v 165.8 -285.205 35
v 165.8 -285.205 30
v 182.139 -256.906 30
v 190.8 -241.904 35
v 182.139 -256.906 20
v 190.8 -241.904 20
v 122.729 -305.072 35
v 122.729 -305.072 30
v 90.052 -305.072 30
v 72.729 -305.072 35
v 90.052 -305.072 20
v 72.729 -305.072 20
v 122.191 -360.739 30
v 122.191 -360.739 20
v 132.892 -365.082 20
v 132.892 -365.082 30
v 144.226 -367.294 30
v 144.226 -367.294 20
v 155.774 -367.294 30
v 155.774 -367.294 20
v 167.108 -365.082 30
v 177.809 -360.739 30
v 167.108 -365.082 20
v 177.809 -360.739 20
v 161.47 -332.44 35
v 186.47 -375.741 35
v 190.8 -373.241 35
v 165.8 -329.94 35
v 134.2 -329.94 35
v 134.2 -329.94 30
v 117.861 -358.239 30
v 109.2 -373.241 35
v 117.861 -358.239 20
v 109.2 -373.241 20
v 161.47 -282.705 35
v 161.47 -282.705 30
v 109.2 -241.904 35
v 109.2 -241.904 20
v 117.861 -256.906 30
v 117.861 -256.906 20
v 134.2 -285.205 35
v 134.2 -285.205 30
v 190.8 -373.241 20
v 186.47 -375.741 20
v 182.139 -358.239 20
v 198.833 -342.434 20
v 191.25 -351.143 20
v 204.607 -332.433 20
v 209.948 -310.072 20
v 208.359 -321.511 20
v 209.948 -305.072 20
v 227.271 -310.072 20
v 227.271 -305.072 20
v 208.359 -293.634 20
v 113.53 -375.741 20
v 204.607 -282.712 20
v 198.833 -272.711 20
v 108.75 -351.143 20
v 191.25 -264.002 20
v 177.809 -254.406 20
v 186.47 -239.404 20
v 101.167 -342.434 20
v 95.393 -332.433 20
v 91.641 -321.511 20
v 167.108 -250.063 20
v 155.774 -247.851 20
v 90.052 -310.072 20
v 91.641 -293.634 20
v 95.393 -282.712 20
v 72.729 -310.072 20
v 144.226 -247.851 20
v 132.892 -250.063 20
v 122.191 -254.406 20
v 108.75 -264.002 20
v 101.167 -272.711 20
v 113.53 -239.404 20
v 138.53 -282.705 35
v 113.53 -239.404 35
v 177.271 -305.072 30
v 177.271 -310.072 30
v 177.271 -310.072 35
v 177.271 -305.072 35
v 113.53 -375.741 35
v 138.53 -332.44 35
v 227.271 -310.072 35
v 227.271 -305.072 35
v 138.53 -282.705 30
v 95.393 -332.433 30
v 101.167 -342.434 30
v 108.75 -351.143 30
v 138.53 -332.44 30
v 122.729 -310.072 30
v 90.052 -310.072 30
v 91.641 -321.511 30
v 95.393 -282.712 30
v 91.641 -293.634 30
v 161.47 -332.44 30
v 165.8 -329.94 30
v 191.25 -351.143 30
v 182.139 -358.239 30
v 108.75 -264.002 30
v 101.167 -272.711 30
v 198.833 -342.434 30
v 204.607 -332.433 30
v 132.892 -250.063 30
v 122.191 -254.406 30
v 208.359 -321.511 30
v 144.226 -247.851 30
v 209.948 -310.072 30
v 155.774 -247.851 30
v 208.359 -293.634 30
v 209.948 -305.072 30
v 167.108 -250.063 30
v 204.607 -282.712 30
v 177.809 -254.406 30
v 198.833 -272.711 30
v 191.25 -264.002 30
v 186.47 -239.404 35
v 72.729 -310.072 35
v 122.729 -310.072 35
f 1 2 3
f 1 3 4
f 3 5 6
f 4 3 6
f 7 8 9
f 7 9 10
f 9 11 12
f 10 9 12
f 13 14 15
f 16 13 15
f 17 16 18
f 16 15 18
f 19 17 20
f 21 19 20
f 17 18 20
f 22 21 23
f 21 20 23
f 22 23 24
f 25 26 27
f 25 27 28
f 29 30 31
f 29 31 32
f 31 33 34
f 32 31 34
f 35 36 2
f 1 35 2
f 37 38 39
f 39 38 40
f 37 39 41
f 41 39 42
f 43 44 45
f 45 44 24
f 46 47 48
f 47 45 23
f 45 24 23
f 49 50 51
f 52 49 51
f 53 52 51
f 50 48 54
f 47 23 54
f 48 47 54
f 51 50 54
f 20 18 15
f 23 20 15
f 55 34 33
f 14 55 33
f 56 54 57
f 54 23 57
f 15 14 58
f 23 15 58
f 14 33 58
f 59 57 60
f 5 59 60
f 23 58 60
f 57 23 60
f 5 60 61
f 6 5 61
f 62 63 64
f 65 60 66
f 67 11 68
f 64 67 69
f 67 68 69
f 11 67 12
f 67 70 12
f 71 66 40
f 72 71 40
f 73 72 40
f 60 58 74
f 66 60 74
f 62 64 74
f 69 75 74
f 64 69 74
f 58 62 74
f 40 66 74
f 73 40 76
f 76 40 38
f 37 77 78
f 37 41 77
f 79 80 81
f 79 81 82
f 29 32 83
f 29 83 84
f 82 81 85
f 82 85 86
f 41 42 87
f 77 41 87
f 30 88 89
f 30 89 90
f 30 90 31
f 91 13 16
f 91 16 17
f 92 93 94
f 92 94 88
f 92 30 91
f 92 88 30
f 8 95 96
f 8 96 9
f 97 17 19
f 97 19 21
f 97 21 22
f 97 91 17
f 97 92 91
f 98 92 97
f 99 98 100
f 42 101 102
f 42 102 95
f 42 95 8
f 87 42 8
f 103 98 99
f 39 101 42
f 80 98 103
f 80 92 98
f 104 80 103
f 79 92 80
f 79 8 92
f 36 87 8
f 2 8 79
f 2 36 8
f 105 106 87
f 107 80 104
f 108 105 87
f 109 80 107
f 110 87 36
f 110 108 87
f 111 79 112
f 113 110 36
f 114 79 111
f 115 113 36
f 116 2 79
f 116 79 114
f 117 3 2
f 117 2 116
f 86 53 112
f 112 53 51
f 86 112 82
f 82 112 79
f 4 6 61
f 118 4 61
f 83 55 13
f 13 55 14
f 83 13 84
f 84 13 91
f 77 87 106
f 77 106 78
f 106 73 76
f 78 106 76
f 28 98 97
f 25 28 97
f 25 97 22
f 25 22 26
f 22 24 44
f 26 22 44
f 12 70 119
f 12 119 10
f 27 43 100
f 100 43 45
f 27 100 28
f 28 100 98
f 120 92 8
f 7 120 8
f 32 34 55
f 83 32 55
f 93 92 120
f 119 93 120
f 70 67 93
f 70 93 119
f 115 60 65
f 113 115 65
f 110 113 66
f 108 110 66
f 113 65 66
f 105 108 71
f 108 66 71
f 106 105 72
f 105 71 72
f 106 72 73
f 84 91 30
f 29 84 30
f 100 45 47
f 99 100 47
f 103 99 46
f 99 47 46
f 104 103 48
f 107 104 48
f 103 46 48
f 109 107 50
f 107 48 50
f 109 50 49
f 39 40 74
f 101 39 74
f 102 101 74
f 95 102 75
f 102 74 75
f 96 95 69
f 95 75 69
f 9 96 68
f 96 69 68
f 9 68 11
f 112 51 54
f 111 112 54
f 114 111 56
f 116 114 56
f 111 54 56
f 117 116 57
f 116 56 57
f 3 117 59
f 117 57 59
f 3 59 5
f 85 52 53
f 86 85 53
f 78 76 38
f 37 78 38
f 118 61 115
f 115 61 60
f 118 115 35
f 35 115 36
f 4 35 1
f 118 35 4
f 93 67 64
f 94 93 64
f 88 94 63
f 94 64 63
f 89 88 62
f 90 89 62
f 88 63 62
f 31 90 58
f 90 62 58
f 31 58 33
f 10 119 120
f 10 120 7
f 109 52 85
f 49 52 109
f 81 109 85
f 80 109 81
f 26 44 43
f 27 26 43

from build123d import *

# Parameters (mm, degrees)
CIRCLE_R         = 60
EXTRUDE067_DEPTH = 10
ARRAY019_W       = 5
ARRAY019_H       = 50
EXTRUDE066_DEPTH = 15


with BuildPart() as extrude093:
    # Circle → Extrude067 (new body)
    with BuildSketch(Plane.XY):
        Circle(CIRCLE_R)
    extrude(amount=EXTRUDE067_DEPTH)


with BuildPart() as fusion045:
    # Array019 → Extrude066 (new body)
    with BuildSketch(Plane(origin=(52.270737, 0, 0), x_dir=(0, 1, 0), z_dir=(0, 0, 1))):
        Rectangle(ARRAY019_W, ARRAY019_H)
        Polygon((22.367151, 36.470305), (65.668421, 11.470305), (68.168421, 15.800432), (24.867151, 40.800432), align=None)
        Polygon((24.867151, 63.741042), (68.168421, 88.741042), (65.668421, 93.071169), (22.367151, 68.071169), align=None)
        with Locations((0, 104.541473)):
            Rectangle(ARRAY019_W, ARRAY019_H)
        Polygon((-22.367151, 68.071169), (-65.668421, 93.071169), (-68.168421, 88.741042), (-24.867151, 63.741042), align=None)
        Polygon((-24.867151, 40.800432), (-68.168421, 15.800432), (-65.668421, 11.470305), (-22.367151, 36.470305), align=None)
    extrude(amount=EXTRUDE066_DEPTH)

    # Fusion045: union Extrude093
    add(extrude093.part)


with BuildPart() as fusion045_1:
    # Fusion045 placement: moved
    add(fusion045.part.moved(Location((150, -307.572449, 20))))


solid = fusion045_1.part
